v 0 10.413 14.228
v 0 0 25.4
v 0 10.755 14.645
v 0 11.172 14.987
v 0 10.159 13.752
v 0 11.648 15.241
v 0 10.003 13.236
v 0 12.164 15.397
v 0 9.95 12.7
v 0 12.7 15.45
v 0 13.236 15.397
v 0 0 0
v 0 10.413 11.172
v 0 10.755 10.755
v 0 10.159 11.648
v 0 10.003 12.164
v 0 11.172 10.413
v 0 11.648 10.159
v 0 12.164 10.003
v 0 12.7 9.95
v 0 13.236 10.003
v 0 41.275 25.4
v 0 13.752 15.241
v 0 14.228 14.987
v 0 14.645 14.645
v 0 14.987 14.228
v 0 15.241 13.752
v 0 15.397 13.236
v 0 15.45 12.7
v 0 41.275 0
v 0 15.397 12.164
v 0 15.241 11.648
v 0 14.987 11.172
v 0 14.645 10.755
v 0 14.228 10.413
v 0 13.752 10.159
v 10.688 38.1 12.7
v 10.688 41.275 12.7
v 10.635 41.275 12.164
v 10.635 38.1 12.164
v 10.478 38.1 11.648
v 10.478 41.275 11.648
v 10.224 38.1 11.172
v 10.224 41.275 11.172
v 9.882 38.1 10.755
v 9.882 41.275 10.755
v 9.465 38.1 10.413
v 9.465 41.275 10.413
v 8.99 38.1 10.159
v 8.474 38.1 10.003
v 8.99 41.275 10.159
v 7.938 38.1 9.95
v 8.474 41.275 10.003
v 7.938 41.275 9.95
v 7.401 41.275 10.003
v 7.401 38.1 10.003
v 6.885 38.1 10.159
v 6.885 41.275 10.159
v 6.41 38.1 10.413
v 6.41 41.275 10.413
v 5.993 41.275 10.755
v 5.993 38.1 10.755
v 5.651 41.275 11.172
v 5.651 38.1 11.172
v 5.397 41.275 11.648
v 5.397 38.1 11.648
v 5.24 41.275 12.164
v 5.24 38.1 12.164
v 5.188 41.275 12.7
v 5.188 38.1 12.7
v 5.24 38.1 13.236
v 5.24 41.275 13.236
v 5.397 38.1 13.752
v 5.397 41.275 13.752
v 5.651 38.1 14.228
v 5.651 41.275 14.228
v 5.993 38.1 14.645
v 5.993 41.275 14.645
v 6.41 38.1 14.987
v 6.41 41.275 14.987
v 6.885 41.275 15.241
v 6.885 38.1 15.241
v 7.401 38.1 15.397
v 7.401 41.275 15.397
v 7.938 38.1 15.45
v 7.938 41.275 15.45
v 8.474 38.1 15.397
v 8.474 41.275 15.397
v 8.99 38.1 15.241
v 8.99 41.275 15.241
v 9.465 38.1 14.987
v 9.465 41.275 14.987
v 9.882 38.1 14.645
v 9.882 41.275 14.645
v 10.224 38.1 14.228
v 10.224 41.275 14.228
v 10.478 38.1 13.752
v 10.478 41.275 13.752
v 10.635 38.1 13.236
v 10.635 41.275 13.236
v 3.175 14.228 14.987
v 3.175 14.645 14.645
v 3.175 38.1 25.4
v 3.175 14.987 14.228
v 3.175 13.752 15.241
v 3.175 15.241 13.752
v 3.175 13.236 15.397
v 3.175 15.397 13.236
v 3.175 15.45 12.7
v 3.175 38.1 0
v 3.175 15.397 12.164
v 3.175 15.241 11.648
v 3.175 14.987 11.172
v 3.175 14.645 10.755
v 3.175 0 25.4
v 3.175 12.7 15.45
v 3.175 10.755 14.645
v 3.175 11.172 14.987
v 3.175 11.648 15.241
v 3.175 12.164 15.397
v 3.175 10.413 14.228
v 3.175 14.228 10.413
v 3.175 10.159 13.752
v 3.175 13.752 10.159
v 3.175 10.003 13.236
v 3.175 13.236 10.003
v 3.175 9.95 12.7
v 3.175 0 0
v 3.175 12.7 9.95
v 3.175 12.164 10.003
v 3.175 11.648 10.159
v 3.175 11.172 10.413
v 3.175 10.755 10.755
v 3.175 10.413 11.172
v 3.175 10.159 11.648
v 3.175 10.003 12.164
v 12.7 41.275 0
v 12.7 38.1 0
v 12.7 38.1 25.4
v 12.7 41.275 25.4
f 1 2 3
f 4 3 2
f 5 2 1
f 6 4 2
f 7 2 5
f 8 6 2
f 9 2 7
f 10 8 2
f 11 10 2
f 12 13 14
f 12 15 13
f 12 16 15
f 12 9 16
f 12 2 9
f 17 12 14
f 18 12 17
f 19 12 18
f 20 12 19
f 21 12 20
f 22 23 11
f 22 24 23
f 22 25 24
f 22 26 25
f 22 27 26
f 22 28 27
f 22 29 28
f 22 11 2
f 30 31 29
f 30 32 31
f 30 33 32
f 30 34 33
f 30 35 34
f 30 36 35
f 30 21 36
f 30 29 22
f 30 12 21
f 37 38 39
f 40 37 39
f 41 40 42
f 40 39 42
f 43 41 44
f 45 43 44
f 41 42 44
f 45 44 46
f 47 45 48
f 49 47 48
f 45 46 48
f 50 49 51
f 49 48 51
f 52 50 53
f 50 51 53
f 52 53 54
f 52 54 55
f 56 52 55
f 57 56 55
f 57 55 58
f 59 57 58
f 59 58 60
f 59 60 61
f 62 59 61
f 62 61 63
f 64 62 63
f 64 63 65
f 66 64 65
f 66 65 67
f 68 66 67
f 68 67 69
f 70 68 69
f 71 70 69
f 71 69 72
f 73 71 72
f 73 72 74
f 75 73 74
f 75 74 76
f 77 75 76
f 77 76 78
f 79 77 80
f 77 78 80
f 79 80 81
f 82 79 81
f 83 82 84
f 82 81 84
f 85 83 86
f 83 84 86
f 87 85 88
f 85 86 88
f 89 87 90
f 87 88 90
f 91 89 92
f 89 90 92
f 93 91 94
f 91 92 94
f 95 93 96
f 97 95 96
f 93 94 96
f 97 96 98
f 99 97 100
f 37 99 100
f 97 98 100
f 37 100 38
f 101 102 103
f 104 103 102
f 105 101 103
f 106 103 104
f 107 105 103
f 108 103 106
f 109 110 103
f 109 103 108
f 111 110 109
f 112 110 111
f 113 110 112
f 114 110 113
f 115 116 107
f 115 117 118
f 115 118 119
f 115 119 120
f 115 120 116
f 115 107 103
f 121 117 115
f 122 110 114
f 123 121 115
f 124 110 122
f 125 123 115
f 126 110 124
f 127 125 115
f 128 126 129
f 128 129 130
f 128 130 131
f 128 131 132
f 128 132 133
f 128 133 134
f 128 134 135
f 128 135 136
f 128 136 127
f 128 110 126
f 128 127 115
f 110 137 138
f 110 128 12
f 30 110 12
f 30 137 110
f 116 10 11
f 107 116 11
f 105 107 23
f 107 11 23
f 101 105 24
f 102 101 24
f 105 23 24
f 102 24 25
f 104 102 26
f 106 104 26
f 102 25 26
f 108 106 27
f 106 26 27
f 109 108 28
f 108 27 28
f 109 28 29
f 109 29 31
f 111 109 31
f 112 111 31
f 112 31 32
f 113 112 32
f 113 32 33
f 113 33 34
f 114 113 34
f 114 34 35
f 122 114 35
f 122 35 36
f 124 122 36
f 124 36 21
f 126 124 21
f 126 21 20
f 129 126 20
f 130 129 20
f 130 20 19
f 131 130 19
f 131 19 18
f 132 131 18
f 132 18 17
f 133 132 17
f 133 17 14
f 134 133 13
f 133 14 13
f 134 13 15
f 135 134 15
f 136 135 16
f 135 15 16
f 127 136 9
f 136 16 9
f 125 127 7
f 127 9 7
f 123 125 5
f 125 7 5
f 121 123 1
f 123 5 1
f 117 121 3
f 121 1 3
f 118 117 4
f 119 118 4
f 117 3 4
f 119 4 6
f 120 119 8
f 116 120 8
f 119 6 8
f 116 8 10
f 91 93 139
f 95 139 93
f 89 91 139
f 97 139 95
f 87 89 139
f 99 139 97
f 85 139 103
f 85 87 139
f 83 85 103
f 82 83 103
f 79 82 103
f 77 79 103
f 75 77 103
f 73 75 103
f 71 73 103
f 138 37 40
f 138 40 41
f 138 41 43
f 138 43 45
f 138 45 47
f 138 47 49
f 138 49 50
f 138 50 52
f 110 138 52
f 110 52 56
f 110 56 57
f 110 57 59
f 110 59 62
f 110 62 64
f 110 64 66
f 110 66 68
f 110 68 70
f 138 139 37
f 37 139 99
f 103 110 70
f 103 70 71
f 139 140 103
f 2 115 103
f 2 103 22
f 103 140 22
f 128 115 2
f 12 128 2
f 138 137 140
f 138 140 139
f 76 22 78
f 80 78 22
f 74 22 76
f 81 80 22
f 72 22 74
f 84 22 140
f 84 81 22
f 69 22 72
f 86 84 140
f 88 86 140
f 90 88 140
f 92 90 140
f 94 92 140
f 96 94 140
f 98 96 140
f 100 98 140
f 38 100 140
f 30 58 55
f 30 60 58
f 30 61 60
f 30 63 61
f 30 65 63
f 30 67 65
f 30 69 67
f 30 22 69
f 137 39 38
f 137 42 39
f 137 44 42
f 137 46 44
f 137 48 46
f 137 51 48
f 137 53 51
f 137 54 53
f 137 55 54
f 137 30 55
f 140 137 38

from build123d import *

# Parameters (mm, degrees)
BOSS_EXTRUDE1_DEPTH  = 25.4
M5_CLEARANCE_HOLE1_D = 5.5
M5_CLEARANCE_HOLE2_D = 5.5


with BuildPart() as part:
    # Sketch2 → Boss-Extrude1 (new body)
    with BuildSketch(Plane.XY):
        Polygon((0, 0), (0, 41.275), (12.7, 41.275), (12.7, 38.1), (3.175, 38.1), (3.175, 0), align=None)
    extrude(amount=BOSS_EXTRUDE1_DEPTH)

    # M5 Clearance Hole1 (through all)
    with Locations(Plane(origin=(0, 38.1, 0), x_dir=(-1, 0, 0), z_dir=(0, -1, 0))):
        with Locations((-7.9375, -12.7)):
            Hole(M5_CLEARANCE_HOLE1_D / 2)

    # M5 Clearance Hole2 (through all)
    with Locations(Plane(origin=(3.175, 0, 0), x_dir=(0, 0, -1), z_dir=(1, 0, 0))):
        with Locations((-12.7, 12.7)):
            Hole(M5_CLEARANCE_HOLE2_D / 2)


solid = part.part
